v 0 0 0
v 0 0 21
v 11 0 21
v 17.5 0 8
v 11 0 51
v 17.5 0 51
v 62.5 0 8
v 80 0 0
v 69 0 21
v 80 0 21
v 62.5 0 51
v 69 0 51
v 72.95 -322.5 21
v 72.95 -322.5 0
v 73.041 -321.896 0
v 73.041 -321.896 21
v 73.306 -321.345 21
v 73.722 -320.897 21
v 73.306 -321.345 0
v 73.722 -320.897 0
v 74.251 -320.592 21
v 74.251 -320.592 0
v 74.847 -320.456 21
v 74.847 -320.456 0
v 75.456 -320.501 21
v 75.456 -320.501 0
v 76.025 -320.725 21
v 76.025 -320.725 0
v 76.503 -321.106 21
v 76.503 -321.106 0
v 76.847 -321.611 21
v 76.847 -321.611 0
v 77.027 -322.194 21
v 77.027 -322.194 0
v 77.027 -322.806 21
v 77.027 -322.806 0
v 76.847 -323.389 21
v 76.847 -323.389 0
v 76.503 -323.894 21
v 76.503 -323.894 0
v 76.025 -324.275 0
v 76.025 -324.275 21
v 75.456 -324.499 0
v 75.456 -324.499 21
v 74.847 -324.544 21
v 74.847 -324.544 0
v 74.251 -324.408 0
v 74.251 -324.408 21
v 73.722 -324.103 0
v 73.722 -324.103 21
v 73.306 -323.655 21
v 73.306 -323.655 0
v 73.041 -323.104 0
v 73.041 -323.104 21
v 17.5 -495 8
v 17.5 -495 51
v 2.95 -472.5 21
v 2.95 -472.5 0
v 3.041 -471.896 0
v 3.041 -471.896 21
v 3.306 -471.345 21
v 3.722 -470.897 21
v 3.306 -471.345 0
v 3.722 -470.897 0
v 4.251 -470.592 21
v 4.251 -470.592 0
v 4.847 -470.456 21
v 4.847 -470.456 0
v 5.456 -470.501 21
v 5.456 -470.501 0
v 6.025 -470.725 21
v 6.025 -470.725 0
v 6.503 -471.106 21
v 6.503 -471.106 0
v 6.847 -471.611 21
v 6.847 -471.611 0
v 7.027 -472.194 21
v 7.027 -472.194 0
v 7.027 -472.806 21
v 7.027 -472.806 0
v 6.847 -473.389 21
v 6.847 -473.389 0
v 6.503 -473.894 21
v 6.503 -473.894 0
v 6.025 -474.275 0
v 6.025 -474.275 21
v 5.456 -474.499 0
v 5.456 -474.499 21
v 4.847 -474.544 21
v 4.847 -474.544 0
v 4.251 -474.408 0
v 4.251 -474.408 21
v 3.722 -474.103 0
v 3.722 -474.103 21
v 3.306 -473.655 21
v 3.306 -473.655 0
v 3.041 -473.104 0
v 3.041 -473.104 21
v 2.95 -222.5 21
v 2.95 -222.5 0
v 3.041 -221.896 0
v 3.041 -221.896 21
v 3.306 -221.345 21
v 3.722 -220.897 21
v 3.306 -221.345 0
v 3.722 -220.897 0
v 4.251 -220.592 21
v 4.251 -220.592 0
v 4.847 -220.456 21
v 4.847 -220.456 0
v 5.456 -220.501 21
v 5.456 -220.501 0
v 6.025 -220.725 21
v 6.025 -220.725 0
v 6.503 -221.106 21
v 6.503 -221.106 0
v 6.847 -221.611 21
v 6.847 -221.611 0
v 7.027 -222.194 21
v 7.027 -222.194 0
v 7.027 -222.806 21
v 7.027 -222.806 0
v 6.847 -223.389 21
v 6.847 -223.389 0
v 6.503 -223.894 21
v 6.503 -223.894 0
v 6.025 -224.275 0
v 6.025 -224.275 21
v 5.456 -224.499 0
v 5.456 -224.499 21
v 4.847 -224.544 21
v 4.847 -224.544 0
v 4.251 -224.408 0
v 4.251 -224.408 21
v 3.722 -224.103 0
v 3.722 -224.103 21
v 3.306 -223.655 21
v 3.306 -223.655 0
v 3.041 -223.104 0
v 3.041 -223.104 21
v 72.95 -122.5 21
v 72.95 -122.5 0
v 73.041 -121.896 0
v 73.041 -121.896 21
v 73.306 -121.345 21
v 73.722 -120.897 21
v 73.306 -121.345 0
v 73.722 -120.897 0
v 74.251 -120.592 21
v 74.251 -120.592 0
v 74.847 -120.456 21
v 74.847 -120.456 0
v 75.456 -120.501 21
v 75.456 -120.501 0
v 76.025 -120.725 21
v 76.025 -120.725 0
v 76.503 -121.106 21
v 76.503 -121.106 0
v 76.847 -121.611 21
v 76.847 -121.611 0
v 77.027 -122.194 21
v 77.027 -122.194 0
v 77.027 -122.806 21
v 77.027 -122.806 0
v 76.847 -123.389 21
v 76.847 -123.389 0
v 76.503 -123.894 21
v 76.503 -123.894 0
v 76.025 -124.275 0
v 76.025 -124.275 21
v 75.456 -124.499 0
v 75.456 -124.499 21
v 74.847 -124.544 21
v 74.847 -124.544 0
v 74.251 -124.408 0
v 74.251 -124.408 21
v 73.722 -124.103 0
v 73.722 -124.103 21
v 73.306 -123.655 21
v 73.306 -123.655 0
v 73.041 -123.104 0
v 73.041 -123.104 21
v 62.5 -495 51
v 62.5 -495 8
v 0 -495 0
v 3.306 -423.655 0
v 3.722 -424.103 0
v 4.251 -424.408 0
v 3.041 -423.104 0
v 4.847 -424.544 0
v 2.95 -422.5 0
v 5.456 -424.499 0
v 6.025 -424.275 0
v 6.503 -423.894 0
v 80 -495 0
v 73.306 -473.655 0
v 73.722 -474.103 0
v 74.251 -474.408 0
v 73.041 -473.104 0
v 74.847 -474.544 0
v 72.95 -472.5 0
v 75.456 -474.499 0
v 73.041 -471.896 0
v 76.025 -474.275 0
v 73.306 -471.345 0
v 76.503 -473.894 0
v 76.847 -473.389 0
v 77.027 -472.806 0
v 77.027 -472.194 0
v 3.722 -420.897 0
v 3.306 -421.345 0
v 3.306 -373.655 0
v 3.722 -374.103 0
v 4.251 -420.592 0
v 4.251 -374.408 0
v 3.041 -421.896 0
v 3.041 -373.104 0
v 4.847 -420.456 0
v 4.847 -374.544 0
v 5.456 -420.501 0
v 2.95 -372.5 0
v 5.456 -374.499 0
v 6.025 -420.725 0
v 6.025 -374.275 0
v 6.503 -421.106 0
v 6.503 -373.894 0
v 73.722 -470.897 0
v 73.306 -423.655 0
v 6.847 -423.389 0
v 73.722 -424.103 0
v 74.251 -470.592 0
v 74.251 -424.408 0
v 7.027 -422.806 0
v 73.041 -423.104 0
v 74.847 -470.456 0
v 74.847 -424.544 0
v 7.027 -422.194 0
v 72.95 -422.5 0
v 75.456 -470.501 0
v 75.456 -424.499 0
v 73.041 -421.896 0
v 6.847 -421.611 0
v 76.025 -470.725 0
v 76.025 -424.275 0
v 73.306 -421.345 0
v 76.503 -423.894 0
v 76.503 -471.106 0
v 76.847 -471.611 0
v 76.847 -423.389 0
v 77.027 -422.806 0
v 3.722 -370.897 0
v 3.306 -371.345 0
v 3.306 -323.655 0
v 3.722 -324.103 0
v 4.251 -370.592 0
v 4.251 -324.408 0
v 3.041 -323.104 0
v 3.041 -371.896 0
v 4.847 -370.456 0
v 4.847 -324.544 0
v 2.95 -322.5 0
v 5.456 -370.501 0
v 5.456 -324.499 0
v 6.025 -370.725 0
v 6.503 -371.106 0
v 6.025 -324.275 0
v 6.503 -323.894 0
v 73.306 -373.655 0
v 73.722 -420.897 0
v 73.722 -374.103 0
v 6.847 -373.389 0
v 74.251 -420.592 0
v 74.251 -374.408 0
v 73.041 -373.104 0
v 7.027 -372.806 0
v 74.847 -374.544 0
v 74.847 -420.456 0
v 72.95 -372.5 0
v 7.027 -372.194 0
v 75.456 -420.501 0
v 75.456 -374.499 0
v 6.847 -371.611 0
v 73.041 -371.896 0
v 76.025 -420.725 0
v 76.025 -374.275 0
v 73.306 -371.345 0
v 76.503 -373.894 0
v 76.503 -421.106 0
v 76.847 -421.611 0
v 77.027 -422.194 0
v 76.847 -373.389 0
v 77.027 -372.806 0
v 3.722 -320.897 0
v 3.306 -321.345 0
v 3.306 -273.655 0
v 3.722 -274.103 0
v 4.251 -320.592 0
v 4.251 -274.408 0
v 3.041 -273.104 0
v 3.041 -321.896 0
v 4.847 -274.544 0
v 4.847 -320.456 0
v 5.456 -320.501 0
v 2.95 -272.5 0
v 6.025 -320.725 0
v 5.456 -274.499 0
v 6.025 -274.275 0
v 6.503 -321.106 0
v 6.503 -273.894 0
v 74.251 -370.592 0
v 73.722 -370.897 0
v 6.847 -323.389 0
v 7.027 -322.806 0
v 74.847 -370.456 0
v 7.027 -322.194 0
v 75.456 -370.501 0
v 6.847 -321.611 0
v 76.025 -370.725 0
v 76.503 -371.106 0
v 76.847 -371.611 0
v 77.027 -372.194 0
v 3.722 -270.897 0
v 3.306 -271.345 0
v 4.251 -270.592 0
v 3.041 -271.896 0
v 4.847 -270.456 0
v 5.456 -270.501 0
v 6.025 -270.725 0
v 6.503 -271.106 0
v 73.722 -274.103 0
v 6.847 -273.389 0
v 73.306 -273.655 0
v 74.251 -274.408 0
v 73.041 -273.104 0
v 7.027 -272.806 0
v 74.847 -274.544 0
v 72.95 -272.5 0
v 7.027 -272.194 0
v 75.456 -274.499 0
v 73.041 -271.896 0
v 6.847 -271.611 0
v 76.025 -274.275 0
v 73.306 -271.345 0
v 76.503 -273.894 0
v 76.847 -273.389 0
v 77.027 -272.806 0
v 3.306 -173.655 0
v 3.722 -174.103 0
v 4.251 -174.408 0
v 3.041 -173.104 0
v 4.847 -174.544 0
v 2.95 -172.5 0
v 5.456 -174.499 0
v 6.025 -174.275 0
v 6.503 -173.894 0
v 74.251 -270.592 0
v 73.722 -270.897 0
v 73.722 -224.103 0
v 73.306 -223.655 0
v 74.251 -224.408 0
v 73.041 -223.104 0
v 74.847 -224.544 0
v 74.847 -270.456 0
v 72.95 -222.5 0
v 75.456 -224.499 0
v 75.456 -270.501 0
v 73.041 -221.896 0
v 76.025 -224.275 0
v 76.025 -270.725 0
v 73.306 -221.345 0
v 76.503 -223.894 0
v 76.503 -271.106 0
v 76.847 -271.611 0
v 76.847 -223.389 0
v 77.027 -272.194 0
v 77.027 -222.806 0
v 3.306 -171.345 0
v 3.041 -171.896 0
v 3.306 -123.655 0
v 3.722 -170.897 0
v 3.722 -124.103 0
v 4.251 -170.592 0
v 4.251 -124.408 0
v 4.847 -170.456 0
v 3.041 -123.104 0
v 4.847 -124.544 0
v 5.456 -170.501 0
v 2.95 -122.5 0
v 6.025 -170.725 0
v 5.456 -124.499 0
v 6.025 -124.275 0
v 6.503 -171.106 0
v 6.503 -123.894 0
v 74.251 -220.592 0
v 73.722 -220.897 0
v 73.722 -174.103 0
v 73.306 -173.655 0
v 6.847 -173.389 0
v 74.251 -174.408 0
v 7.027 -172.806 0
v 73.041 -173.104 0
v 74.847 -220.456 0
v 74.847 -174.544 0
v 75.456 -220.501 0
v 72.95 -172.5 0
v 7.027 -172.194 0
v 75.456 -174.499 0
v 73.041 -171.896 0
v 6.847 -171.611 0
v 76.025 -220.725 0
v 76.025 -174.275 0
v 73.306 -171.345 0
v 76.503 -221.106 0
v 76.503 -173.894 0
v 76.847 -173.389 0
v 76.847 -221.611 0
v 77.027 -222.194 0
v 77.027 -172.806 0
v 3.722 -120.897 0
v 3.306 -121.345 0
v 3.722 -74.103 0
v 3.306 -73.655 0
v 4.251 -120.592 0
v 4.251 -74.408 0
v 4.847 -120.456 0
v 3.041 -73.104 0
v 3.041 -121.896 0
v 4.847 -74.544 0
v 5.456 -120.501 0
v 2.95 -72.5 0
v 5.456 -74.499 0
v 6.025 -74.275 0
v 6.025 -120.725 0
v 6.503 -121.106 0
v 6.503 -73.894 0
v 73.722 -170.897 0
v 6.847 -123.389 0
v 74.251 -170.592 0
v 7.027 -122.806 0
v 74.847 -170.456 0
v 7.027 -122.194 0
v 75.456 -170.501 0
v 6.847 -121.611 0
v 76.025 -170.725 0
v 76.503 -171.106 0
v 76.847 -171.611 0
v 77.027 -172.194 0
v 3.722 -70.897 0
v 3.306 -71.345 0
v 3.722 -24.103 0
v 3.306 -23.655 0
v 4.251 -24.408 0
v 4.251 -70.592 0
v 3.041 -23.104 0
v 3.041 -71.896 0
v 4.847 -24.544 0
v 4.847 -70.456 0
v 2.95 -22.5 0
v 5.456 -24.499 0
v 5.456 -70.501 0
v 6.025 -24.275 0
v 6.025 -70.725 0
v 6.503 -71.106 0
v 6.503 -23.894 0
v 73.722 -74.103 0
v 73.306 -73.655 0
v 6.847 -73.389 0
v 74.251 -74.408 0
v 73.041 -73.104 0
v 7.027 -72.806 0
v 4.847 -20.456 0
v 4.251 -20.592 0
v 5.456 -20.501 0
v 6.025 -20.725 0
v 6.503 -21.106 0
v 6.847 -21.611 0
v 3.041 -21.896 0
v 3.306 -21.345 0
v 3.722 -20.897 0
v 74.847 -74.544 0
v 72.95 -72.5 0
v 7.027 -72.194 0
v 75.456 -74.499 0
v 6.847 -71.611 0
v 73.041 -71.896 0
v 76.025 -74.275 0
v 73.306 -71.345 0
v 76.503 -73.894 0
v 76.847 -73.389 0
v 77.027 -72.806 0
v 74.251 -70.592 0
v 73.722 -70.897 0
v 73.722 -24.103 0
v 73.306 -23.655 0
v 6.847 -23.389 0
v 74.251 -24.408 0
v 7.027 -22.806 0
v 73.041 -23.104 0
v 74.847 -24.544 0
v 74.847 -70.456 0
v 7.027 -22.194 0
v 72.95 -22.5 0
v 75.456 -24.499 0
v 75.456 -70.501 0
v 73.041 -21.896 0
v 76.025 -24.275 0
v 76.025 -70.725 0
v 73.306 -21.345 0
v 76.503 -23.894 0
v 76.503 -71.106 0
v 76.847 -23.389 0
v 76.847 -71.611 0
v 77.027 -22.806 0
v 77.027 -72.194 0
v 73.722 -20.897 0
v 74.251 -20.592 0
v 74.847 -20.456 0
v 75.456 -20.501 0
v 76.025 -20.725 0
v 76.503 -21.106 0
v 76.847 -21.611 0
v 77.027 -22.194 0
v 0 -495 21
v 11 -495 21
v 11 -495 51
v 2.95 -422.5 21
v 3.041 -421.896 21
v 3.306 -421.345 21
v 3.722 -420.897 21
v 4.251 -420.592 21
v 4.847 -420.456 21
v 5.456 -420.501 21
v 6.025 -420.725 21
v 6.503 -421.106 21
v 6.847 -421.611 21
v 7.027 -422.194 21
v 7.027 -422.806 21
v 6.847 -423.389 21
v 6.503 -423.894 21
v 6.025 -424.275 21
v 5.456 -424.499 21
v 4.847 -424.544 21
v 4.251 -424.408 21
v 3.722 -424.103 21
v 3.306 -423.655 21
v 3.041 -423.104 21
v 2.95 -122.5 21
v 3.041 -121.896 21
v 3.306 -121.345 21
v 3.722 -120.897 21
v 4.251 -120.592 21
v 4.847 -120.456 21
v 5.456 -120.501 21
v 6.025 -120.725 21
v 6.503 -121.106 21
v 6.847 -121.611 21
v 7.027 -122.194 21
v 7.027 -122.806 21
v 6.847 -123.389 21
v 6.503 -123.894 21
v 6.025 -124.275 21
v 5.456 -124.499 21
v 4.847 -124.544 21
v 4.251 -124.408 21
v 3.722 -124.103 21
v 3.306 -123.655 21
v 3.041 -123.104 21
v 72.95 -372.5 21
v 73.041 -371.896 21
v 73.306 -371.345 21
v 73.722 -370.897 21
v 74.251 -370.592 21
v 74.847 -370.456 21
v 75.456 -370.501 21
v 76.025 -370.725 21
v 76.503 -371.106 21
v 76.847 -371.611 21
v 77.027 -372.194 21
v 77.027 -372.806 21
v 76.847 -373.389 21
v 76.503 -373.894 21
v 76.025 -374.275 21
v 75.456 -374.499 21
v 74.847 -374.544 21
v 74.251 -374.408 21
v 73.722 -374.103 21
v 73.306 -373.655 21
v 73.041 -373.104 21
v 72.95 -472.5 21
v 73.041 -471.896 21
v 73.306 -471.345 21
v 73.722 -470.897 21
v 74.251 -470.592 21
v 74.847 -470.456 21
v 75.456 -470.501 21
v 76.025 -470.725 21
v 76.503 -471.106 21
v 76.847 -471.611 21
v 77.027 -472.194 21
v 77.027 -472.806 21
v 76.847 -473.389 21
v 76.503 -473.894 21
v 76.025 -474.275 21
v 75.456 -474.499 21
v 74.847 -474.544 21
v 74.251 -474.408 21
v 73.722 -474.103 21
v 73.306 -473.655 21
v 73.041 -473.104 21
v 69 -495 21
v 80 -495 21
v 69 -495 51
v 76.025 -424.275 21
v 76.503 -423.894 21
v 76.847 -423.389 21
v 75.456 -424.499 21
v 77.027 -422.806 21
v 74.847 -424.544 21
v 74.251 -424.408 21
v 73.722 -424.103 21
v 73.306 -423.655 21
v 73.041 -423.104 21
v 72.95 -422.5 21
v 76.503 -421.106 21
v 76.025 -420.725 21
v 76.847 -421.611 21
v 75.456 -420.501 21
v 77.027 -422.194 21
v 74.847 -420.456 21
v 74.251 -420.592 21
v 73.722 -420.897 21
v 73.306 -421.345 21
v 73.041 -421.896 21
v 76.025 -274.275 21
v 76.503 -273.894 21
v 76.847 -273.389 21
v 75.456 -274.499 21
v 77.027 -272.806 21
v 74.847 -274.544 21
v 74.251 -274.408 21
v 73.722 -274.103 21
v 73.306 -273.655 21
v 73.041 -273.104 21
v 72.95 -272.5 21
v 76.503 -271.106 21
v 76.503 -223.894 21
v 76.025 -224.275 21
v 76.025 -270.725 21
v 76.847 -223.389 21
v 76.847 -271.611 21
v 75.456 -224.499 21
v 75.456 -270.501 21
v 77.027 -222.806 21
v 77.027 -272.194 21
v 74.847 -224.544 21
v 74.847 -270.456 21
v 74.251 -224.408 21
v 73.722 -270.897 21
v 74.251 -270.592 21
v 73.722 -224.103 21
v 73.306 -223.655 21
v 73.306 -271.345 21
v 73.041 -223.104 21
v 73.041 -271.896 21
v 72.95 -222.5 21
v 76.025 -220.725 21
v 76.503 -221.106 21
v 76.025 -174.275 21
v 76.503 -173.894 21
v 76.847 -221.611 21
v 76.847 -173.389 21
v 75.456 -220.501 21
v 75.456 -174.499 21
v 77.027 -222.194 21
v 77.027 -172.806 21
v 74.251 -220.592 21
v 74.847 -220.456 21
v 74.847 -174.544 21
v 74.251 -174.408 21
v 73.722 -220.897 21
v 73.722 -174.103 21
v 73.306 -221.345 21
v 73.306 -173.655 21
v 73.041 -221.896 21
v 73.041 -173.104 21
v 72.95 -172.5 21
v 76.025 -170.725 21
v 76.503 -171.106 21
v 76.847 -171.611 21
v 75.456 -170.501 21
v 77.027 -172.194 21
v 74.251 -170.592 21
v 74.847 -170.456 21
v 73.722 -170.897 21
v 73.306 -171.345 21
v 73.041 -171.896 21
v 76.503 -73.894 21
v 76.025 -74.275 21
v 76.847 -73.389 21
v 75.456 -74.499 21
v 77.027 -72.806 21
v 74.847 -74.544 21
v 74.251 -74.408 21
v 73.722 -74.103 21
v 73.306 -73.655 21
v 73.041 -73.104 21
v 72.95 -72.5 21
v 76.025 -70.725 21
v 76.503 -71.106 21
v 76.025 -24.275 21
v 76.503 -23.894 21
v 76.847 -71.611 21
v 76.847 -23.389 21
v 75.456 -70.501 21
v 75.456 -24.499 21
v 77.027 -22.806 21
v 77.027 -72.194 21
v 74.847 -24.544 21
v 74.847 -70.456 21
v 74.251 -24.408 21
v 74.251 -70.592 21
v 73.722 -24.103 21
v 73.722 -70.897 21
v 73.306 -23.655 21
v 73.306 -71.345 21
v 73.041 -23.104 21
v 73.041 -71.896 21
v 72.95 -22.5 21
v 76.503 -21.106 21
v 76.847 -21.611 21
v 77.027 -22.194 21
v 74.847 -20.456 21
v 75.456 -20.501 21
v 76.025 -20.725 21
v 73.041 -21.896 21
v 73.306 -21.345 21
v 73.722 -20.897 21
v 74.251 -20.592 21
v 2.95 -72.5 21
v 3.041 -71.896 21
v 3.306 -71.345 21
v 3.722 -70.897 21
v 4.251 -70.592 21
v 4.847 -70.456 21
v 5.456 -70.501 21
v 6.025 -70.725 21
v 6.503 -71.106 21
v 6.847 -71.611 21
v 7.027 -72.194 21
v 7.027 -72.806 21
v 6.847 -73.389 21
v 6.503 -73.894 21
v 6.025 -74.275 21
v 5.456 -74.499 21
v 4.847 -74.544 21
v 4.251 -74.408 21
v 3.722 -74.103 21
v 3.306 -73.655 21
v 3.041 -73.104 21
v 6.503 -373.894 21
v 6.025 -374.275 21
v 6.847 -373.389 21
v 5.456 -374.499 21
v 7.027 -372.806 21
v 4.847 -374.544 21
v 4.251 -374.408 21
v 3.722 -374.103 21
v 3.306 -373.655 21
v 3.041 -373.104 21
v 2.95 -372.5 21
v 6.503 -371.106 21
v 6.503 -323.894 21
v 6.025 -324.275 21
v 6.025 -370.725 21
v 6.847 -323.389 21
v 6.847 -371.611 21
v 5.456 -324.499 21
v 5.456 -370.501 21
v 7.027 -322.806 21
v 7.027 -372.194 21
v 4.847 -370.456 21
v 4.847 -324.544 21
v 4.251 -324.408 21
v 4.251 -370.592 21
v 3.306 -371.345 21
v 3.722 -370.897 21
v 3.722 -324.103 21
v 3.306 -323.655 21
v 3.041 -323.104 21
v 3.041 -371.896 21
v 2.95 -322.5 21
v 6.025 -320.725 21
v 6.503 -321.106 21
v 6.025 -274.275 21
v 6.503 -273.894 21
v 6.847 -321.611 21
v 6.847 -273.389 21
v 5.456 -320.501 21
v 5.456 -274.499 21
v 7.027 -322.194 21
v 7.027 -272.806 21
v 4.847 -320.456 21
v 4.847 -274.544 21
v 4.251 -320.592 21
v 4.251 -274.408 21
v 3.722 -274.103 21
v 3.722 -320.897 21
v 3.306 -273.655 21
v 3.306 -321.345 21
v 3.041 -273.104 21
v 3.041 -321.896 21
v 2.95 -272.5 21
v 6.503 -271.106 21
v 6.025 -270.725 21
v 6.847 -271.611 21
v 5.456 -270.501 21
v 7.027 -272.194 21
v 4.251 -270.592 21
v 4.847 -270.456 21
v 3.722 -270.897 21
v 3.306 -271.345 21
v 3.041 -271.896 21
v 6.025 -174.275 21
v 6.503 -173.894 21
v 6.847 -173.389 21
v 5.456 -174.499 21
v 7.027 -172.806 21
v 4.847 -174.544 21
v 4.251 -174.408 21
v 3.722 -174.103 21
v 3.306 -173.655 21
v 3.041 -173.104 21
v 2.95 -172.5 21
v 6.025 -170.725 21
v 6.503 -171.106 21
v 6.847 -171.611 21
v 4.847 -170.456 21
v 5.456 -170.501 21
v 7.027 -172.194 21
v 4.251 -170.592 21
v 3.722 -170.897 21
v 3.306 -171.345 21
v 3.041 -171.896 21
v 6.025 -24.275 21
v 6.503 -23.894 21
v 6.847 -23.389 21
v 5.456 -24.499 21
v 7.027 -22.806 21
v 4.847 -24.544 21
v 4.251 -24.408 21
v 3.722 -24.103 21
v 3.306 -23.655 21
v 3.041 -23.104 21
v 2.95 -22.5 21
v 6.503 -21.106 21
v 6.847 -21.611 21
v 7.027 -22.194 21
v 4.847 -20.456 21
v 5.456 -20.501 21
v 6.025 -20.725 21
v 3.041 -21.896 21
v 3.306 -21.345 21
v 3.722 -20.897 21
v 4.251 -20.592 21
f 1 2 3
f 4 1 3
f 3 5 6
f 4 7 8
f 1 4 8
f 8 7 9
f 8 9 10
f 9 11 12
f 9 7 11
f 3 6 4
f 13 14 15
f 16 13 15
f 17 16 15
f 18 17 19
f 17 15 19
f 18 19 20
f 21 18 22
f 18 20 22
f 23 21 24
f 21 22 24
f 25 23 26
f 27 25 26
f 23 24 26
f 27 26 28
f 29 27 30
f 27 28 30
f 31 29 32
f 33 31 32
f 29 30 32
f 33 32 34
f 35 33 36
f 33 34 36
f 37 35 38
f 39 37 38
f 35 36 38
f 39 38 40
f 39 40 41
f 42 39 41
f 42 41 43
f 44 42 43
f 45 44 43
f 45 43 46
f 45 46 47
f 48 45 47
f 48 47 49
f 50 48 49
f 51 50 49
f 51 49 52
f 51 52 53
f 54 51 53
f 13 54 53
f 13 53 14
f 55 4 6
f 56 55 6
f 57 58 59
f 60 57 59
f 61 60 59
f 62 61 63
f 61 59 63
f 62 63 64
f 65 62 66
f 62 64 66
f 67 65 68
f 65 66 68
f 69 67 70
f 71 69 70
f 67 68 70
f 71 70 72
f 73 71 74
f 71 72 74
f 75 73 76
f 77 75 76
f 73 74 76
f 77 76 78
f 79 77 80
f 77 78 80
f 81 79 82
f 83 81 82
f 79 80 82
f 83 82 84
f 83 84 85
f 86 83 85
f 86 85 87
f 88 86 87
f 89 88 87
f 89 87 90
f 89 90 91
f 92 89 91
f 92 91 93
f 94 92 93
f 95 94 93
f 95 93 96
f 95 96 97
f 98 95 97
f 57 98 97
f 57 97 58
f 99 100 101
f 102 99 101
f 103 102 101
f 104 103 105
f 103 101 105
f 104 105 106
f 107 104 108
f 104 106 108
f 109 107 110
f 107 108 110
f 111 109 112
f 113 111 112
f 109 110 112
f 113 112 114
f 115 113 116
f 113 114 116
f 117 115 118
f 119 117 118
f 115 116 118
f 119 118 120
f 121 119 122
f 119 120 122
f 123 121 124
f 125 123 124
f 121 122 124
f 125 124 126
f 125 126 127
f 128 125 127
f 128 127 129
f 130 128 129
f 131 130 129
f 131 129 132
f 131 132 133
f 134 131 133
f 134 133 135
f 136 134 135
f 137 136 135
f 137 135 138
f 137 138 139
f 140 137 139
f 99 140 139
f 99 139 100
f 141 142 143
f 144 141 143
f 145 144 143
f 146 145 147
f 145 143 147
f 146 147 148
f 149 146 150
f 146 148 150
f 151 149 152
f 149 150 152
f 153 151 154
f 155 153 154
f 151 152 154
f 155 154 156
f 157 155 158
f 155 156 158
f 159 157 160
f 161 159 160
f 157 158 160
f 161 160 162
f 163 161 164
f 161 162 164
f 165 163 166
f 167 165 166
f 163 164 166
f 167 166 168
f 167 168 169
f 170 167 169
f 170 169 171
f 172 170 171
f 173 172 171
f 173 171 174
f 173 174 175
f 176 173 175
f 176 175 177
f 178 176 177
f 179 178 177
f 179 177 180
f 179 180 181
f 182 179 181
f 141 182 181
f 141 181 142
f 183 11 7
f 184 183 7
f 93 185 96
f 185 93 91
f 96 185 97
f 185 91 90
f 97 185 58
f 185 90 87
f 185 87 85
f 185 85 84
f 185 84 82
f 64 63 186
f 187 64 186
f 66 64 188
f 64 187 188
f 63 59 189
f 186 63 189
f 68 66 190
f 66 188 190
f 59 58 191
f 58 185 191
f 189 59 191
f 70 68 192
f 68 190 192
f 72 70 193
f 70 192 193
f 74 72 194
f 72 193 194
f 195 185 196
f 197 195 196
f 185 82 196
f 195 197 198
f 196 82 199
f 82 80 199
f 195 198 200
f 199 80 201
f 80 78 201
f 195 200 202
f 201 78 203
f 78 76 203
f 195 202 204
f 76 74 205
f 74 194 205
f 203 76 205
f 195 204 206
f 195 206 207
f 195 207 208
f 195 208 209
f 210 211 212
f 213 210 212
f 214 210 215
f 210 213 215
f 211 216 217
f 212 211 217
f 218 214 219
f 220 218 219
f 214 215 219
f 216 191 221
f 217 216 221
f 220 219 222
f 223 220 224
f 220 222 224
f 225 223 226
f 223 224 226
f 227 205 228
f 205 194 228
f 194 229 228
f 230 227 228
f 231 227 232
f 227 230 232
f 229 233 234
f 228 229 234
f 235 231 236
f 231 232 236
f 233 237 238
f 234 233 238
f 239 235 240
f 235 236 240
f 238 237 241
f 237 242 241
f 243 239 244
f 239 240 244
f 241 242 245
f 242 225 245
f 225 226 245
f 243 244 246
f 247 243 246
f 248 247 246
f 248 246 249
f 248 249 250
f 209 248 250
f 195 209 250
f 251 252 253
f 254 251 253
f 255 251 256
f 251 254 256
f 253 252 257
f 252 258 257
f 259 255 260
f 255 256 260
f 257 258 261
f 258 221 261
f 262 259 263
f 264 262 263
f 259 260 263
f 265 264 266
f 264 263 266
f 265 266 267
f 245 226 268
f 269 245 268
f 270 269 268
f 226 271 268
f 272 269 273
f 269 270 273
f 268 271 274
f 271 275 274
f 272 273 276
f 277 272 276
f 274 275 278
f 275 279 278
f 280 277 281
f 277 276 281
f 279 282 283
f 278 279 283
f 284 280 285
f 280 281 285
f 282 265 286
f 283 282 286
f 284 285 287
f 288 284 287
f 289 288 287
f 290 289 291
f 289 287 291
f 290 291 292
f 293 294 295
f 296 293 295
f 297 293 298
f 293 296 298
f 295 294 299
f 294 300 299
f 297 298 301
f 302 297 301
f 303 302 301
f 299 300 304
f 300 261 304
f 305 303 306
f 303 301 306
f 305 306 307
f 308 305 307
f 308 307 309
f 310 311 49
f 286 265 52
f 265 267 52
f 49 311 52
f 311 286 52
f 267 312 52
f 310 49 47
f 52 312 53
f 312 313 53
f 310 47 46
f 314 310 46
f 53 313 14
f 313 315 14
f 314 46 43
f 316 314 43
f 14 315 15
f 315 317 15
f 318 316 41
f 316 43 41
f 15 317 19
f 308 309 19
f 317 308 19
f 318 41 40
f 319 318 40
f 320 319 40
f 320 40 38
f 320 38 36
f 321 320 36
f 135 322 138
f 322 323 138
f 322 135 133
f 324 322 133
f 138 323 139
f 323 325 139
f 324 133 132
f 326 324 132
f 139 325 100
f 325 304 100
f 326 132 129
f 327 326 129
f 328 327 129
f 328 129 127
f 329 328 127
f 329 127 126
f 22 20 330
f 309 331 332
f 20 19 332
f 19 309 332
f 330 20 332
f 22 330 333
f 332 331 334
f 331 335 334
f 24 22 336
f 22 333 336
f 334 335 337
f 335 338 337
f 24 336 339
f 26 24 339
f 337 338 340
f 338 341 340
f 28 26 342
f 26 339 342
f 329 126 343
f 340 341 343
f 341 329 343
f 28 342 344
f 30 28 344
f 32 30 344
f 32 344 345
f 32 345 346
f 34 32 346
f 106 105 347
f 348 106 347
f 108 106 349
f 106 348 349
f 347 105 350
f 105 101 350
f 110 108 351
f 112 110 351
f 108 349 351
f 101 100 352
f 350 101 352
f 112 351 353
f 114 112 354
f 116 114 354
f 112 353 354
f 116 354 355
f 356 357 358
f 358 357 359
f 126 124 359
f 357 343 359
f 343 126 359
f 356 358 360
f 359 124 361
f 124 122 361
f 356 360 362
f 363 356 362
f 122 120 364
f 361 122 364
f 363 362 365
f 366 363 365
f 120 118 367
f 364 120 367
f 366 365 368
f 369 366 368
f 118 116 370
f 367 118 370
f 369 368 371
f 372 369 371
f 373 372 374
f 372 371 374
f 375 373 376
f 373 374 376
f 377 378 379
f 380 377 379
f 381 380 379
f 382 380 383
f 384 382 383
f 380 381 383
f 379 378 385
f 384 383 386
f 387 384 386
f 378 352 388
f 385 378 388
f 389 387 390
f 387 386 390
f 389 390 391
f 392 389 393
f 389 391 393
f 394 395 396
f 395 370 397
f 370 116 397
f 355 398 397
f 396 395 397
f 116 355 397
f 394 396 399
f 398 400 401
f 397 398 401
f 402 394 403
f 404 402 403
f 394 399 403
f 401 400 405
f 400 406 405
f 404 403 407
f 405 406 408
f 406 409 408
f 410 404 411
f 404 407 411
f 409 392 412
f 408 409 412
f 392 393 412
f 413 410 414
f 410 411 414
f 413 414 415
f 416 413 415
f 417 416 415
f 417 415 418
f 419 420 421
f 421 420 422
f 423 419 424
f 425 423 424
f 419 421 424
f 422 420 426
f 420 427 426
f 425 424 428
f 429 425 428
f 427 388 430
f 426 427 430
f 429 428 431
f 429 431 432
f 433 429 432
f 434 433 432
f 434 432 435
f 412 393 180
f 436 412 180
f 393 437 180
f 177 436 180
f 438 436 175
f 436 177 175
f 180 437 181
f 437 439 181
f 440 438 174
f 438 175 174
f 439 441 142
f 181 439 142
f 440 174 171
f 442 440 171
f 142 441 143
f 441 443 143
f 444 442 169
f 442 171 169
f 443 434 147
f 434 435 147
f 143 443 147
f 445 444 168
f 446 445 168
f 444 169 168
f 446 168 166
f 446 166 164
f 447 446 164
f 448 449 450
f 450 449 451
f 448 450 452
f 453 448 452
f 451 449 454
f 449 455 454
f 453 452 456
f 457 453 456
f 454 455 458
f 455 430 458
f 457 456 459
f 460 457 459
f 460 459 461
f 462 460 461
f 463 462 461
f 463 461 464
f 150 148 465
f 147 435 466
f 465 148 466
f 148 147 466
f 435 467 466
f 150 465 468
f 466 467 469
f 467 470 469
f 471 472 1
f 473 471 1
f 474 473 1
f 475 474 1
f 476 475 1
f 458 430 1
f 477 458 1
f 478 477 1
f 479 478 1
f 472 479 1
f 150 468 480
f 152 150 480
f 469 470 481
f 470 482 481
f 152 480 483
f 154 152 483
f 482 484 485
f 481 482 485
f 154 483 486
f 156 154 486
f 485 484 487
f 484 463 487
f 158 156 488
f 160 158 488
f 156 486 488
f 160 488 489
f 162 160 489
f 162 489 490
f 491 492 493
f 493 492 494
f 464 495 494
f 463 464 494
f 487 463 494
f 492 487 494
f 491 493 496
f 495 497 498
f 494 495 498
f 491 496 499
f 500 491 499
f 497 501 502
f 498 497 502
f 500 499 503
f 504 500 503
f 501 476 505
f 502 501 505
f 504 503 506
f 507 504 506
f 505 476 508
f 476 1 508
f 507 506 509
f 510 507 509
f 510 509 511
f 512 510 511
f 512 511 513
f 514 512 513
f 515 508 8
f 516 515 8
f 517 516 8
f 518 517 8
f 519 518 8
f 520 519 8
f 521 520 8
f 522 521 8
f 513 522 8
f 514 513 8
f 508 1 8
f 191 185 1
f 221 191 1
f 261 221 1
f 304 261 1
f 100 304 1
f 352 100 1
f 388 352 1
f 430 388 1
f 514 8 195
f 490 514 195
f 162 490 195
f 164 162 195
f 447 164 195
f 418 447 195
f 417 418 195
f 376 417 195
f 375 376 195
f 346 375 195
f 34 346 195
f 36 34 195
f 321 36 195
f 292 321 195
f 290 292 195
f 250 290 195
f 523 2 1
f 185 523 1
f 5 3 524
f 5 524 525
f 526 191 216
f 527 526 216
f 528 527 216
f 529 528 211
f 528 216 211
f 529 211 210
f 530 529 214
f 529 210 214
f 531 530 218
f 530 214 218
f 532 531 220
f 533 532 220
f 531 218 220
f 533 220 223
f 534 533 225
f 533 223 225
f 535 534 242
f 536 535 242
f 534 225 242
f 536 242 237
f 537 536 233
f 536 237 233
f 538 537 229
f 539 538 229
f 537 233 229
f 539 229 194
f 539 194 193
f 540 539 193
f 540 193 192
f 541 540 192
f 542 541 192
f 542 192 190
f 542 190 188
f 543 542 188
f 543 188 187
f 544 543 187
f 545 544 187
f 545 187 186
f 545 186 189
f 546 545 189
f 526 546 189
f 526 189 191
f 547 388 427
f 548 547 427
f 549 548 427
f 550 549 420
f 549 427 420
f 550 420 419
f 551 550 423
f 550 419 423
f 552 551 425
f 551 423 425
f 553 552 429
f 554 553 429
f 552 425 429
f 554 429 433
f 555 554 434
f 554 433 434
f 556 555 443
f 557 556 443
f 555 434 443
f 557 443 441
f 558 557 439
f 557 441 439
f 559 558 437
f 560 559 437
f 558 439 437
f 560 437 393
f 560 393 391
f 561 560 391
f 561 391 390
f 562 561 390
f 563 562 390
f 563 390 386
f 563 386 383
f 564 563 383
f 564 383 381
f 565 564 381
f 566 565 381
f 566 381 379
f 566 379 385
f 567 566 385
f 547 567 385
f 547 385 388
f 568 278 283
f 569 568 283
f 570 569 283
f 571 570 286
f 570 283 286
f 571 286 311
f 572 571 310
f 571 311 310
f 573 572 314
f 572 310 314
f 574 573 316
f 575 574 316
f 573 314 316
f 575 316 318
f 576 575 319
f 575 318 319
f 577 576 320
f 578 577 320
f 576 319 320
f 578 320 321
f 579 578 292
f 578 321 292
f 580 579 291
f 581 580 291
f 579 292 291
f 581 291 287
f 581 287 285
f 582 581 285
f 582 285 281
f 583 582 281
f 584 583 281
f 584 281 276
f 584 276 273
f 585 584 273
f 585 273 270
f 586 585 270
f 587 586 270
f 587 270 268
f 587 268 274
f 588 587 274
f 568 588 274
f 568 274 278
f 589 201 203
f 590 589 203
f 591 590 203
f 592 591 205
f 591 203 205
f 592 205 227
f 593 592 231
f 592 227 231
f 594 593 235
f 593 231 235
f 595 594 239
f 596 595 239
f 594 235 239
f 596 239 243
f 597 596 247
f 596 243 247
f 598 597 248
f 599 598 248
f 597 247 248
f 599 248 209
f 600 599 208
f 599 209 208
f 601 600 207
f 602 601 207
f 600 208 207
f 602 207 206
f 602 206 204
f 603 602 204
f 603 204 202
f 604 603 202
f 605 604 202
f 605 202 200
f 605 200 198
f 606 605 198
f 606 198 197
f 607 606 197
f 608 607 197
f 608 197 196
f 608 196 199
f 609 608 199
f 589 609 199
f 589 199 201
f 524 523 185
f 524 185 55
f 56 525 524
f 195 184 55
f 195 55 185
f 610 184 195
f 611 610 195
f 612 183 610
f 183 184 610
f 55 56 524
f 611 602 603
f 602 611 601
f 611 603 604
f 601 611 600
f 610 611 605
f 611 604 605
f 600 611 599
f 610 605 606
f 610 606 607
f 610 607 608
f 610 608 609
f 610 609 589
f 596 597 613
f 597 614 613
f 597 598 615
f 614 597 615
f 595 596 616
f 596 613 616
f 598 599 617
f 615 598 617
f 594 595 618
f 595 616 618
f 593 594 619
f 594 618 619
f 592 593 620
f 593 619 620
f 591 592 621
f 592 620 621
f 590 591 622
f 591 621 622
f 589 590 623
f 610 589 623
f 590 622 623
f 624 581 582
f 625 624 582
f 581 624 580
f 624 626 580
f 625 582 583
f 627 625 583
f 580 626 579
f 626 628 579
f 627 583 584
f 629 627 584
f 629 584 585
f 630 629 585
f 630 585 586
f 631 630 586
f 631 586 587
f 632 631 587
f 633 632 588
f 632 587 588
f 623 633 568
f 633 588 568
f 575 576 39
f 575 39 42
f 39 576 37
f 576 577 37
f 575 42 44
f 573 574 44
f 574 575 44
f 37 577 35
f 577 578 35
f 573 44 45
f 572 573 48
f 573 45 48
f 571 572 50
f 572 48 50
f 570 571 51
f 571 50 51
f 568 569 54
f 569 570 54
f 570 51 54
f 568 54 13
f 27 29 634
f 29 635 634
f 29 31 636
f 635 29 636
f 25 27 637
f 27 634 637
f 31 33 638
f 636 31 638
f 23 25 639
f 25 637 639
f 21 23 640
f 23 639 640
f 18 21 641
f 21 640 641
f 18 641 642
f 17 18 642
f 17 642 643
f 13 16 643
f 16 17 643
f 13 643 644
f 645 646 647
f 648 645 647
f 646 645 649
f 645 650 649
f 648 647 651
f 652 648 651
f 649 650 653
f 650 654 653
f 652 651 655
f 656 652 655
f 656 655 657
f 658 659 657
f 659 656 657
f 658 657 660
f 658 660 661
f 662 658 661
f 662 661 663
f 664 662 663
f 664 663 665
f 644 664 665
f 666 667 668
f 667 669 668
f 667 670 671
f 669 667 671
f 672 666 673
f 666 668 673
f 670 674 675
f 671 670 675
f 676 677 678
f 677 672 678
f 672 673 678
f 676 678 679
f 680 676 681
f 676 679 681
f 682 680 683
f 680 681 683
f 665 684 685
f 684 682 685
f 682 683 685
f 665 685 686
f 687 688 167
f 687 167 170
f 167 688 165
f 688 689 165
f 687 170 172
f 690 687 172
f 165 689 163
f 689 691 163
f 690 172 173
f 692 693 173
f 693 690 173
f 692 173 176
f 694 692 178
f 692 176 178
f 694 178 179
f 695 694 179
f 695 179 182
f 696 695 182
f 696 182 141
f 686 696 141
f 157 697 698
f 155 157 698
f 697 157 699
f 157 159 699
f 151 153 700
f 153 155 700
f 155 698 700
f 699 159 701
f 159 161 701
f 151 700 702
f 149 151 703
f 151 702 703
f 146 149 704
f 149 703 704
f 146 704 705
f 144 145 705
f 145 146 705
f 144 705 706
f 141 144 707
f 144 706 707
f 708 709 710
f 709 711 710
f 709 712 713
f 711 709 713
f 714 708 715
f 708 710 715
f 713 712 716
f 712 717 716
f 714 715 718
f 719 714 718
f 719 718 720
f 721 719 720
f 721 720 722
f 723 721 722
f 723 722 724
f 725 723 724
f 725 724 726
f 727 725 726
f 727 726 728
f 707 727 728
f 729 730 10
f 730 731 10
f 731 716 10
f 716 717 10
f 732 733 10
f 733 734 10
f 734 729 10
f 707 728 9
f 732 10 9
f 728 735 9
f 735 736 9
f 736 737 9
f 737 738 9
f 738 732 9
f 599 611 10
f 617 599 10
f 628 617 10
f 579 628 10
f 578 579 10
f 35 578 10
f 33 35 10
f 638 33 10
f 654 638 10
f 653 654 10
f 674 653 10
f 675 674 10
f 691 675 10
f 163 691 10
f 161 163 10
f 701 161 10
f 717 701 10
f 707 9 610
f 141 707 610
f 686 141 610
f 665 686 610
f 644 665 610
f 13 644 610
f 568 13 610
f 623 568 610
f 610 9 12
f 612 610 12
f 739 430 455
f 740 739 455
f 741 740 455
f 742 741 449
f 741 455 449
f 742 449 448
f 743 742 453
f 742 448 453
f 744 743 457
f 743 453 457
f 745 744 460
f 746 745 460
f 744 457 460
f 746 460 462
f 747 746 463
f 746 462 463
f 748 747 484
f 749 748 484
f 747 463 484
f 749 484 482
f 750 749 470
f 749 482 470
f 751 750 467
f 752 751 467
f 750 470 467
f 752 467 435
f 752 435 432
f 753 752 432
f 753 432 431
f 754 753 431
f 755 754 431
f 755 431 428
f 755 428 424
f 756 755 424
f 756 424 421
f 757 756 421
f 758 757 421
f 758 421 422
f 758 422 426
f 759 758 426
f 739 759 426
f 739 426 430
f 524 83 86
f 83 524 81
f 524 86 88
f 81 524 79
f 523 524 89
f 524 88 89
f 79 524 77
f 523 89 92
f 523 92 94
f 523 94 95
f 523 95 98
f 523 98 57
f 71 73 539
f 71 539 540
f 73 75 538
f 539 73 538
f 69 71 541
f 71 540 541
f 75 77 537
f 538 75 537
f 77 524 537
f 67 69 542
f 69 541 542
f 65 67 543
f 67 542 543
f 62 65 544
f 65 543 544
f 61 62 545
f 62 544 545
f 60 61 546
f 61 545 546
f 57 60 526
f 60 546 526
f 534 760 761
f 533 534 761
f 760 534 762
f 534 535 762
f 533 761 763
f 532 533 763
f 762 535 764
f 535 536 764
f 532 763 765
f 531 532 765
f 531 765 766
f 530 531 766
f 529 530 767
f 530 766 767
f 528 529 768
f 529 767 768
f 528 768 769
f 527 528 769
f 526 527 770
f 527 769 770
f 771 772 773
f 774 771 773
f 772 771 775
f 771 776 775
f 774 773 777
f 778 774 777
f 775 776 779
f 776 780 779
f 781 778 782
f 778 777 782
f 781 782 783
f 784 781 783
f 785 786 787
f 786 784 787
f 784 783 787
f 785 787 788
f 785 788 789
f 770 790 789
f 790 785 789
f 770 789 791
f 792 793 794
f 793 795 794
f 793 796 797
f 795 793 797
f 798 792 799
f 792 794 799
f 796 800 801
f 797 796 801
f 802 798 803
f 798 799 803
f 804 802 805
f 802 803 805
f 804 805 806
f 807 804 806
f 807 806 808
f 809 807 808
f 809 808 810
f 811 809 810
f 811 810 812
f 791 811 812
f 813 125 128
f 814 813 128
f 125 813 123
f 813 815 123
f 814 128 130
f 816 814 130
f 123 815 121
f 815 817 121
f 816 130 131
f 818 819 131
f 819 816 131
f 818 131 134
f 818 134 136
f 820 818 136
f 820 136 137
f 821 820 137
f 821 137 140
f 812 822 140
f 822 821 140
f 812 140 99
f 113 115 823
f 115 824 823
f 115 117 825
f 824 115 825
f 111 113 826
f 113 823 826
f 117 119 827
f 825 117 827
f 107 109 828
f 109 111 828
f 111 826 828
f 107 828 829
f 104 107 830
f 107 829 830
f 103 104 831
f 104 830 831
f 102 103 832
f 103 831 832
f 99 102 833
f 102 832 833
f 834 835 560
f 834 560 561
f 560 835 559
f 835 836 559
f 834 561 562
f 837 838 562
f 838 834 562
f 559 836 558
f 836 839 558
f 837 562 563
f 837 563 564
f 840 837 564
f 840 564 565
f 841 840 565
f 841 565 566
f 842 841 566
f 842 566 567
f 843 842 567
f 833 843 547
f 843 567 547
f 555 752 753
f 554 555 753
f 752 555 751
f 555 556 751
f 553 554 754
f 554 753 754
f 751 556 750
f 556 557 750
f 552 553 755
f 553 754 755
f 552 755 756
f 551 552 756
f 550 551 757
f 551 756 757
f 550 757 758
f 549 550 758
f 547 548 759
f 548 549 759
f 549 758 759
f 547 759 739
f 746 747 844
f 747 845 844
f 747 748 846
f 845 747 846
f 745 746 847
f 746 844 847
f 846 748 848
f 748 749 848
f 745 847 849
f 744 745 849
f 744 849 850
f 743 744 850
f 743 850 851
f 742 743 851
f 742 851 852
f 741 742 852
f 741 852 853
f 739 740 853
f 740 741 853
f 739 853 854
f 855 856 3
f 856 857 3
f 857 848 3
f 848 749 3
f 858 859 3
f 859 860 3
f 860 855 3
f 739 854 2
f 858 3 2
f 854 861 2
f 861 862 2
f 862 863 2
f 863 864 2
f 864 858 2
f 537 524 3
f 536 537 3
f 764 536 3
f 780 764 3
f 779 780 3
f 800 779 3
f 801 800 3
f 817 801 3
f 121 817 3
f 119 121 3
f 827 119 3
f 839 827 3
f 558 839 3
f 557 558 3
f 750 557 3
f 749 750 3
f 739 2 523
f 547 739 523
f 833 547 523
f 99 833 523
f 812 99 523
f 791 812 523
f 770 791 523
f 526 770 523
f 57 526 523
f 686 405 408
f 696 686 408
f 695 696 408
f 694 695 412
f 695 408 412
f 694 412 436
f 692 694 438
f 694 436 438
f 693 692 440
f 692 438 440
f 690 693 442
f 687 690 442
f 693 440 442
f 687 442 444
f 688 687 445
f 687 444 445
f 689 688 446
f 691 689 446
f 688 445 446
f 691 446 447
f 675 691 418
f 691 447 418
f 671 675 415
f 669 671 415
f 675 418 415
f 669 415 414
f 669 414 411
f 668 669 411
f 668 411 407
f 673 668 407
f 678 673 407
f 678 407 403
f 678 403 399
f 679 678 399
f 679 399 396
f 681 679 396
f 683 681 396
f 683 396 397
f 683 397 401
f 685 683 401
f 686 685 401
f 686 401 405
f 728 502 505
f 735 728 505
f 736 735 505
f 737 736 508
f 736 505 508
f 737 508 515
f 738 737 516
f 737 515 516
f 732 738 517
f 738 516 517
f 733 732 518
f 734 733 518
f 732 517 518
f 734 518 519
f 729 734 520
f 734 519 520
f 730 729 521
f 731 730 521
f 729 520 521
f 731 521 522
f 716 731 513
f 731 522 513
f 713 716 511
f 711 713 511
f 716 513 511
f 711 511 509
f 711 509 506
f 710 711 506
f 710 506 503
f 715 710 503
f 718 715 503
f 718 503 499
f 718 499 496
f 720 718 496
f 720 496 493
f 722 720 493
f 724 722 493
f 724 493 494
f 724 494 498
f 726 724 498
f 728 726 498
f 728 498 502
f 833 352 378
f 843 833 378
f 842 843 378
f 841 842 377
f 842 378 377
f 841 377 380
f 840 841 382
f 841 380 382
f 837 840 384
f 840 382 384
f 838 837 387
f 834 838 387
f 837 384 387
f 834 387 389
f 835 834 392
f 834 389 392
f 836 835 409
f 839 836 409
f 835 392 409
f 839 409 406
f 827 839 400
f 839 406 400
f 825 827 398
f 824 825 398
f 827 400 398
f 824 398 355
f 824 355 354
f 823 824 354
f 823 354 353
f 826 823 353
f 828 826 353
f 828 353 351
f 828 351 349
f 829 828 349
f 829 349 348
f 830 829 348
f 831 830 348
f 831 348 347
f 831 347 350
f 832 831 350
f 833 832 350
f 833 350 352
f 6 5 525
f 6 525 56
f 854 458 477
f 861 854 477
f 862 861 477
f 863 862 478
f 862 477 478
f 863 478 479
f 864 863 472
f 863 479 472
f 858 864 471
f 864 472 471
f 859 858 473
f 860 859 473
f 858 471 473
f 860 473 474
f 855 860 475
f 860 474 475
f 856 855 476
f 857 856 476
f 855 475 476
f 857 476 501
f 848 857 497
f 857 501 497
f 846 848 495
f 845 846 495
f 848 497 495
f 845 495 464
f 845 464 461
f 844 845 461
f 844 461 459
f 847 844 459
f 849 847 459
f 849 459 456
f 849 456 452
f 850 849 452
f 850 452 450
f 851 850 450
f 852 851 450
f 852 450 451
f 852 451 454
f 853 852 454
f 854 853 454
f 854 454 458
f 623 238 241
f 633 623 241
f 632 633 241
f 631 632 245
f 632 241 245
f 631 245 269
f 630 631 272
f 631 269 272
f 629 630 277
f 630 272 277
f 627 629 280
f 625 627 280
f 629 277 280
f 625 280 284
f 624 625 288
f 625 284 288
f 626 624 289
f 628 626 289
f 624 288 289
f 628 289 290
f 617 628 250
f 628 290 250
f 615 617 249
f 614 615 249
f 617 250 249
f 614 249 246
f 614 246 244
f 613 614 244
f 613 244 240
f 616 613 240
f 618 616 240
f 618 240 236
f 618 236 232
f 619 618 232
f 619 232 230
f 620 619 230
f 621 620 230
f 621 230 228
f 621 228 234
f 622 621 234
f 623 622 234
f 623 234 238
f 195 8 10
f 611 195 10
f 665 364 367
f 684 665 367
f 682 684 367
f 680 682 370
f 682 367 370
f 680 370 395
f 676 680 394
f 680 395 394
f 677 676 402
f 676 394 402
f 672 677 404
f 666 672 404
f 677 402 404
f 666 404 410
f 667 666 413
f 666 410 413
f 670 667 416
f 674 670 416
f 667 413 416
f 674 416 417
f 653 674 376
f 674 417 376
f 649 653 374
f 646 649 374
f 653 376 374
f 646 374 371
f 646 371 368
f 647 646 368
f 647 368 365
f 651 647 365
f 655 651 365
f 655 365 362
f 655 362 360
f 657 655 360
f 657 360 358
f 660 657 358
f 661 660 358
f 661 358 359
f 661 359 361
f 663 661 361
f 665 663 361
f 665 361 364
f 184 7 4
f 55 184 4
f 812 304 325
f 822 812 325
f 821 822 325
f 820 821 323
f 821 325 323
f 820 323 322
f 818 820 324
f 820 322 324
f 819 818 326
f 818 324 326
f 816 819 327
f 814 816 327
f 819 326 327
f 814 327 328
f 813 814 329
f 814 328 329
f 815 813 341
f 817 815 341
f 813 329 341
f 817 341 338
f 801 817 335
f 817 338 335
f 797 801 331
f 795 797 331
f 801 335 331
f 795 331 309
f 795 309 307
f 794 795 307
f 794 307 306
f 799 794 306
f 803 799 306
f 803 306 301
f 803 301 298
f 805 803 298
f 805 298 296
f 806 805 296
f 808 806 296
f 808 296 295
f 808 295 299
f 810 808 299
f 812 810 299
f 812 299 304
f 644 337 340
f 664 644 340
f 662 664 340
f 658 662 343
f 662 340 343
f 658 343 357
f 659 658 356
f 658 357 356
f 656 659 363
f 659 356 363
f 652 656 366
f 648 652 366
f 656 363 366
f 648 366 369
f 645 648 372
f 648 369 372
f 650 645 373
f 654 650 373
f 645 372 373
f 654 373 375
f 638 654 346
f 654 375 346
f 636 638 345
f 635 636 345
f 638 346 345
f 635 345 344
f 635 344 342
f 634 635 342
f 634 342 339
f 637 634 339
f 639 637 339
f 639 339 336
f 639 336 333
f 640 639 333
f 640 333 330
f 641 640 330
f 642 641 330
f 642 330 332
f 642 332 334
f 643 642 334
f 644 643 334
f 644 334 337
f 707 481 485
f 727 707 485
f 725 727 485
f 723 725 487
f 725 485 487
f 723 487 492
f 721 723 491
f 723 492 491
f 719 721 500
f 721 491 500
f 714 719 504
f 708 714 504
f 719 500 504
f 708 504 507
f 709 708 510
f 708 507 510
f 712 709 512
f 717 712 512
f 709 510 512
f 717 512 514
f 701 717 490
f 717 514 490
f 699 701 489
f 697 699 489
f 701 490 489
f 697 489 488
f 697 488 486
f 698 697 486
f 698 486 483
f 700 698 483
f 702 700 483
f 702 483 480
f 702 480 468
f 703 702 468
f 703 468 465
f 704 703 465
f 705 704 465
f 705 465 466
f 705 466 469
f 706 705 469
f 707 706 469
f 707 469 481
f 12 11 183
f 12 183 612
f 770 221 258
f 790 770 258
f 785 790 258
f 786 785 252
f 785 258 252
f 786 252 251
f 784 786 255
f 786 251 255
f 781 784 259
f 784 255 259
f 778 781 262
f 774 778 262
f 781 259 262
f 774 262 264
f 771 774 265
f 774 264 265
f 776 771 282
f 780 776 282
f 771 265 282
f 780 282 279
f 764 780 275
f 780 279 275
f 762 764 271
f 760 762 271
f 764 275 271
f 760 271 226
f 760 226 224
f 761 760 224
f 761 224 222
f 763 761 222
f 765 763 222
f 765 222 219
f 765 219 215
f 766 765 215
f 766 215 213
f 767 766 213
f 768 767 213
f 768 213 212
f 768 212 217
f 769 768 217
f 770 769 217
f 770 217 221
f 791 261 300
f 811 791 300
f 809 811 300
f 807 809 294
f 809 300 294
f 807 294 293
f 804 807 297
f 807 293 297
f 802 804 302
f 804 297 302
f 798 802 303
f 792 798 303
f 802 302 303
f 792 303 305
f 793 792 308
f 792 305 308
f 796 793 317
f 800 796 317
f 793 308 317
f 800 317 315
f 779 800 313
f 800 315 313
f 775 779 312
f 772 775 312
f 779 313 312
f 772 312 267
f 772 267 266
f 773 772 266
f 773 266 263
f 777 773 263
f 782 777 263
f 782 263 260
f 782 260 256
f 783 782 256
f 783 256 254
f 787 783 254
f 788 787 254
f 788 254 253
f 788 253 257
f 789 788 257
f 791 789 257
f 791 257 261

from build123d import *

# Parameters (mm, degrees)
F0_W     = 6.5
F0_H     = 30
F1_DEPTH = 495
F3_D     = 4.1


with BuildPart() as f1:
    # F0 (on Front) → F1 (new body)
    with BuildSketch(Plane.XZ):
        with Locations((14.25, 36)):
            Rectangle(F0_W, F0_H)
        with Locations((65.75, 36)):
            Rectangle(F0_W, F0_H)
        Polygon((0, 21), (0, 0), (80, 0), (80, 21), (69, 21), (62.5, 21), (62.5, 8), (17.5, 8), (17.5, 21), (11, 21), align=None)
    extrude(amount=F1_DEPTH)

    # F3 (through all)
    with Locations(Plane.XY.offset(21)):
        with Locations((75, -22.5), (75, -72.5), (75, -122.5), (75, -172.5), (75, -222.5), (75, -272.5), (75, -322.5), (75, -372.5), (75, -422.5), (75, -472.5), (5, -22.5), (5, -72.5), (5, -122.5), (5, -172.5), (5, -222.5), (5, -272.5), (5, -322.5), (5, -372.5), (5, -422.5), (5, -472.5)):
            Hole(F3_D / 2)


solid = f1.part
